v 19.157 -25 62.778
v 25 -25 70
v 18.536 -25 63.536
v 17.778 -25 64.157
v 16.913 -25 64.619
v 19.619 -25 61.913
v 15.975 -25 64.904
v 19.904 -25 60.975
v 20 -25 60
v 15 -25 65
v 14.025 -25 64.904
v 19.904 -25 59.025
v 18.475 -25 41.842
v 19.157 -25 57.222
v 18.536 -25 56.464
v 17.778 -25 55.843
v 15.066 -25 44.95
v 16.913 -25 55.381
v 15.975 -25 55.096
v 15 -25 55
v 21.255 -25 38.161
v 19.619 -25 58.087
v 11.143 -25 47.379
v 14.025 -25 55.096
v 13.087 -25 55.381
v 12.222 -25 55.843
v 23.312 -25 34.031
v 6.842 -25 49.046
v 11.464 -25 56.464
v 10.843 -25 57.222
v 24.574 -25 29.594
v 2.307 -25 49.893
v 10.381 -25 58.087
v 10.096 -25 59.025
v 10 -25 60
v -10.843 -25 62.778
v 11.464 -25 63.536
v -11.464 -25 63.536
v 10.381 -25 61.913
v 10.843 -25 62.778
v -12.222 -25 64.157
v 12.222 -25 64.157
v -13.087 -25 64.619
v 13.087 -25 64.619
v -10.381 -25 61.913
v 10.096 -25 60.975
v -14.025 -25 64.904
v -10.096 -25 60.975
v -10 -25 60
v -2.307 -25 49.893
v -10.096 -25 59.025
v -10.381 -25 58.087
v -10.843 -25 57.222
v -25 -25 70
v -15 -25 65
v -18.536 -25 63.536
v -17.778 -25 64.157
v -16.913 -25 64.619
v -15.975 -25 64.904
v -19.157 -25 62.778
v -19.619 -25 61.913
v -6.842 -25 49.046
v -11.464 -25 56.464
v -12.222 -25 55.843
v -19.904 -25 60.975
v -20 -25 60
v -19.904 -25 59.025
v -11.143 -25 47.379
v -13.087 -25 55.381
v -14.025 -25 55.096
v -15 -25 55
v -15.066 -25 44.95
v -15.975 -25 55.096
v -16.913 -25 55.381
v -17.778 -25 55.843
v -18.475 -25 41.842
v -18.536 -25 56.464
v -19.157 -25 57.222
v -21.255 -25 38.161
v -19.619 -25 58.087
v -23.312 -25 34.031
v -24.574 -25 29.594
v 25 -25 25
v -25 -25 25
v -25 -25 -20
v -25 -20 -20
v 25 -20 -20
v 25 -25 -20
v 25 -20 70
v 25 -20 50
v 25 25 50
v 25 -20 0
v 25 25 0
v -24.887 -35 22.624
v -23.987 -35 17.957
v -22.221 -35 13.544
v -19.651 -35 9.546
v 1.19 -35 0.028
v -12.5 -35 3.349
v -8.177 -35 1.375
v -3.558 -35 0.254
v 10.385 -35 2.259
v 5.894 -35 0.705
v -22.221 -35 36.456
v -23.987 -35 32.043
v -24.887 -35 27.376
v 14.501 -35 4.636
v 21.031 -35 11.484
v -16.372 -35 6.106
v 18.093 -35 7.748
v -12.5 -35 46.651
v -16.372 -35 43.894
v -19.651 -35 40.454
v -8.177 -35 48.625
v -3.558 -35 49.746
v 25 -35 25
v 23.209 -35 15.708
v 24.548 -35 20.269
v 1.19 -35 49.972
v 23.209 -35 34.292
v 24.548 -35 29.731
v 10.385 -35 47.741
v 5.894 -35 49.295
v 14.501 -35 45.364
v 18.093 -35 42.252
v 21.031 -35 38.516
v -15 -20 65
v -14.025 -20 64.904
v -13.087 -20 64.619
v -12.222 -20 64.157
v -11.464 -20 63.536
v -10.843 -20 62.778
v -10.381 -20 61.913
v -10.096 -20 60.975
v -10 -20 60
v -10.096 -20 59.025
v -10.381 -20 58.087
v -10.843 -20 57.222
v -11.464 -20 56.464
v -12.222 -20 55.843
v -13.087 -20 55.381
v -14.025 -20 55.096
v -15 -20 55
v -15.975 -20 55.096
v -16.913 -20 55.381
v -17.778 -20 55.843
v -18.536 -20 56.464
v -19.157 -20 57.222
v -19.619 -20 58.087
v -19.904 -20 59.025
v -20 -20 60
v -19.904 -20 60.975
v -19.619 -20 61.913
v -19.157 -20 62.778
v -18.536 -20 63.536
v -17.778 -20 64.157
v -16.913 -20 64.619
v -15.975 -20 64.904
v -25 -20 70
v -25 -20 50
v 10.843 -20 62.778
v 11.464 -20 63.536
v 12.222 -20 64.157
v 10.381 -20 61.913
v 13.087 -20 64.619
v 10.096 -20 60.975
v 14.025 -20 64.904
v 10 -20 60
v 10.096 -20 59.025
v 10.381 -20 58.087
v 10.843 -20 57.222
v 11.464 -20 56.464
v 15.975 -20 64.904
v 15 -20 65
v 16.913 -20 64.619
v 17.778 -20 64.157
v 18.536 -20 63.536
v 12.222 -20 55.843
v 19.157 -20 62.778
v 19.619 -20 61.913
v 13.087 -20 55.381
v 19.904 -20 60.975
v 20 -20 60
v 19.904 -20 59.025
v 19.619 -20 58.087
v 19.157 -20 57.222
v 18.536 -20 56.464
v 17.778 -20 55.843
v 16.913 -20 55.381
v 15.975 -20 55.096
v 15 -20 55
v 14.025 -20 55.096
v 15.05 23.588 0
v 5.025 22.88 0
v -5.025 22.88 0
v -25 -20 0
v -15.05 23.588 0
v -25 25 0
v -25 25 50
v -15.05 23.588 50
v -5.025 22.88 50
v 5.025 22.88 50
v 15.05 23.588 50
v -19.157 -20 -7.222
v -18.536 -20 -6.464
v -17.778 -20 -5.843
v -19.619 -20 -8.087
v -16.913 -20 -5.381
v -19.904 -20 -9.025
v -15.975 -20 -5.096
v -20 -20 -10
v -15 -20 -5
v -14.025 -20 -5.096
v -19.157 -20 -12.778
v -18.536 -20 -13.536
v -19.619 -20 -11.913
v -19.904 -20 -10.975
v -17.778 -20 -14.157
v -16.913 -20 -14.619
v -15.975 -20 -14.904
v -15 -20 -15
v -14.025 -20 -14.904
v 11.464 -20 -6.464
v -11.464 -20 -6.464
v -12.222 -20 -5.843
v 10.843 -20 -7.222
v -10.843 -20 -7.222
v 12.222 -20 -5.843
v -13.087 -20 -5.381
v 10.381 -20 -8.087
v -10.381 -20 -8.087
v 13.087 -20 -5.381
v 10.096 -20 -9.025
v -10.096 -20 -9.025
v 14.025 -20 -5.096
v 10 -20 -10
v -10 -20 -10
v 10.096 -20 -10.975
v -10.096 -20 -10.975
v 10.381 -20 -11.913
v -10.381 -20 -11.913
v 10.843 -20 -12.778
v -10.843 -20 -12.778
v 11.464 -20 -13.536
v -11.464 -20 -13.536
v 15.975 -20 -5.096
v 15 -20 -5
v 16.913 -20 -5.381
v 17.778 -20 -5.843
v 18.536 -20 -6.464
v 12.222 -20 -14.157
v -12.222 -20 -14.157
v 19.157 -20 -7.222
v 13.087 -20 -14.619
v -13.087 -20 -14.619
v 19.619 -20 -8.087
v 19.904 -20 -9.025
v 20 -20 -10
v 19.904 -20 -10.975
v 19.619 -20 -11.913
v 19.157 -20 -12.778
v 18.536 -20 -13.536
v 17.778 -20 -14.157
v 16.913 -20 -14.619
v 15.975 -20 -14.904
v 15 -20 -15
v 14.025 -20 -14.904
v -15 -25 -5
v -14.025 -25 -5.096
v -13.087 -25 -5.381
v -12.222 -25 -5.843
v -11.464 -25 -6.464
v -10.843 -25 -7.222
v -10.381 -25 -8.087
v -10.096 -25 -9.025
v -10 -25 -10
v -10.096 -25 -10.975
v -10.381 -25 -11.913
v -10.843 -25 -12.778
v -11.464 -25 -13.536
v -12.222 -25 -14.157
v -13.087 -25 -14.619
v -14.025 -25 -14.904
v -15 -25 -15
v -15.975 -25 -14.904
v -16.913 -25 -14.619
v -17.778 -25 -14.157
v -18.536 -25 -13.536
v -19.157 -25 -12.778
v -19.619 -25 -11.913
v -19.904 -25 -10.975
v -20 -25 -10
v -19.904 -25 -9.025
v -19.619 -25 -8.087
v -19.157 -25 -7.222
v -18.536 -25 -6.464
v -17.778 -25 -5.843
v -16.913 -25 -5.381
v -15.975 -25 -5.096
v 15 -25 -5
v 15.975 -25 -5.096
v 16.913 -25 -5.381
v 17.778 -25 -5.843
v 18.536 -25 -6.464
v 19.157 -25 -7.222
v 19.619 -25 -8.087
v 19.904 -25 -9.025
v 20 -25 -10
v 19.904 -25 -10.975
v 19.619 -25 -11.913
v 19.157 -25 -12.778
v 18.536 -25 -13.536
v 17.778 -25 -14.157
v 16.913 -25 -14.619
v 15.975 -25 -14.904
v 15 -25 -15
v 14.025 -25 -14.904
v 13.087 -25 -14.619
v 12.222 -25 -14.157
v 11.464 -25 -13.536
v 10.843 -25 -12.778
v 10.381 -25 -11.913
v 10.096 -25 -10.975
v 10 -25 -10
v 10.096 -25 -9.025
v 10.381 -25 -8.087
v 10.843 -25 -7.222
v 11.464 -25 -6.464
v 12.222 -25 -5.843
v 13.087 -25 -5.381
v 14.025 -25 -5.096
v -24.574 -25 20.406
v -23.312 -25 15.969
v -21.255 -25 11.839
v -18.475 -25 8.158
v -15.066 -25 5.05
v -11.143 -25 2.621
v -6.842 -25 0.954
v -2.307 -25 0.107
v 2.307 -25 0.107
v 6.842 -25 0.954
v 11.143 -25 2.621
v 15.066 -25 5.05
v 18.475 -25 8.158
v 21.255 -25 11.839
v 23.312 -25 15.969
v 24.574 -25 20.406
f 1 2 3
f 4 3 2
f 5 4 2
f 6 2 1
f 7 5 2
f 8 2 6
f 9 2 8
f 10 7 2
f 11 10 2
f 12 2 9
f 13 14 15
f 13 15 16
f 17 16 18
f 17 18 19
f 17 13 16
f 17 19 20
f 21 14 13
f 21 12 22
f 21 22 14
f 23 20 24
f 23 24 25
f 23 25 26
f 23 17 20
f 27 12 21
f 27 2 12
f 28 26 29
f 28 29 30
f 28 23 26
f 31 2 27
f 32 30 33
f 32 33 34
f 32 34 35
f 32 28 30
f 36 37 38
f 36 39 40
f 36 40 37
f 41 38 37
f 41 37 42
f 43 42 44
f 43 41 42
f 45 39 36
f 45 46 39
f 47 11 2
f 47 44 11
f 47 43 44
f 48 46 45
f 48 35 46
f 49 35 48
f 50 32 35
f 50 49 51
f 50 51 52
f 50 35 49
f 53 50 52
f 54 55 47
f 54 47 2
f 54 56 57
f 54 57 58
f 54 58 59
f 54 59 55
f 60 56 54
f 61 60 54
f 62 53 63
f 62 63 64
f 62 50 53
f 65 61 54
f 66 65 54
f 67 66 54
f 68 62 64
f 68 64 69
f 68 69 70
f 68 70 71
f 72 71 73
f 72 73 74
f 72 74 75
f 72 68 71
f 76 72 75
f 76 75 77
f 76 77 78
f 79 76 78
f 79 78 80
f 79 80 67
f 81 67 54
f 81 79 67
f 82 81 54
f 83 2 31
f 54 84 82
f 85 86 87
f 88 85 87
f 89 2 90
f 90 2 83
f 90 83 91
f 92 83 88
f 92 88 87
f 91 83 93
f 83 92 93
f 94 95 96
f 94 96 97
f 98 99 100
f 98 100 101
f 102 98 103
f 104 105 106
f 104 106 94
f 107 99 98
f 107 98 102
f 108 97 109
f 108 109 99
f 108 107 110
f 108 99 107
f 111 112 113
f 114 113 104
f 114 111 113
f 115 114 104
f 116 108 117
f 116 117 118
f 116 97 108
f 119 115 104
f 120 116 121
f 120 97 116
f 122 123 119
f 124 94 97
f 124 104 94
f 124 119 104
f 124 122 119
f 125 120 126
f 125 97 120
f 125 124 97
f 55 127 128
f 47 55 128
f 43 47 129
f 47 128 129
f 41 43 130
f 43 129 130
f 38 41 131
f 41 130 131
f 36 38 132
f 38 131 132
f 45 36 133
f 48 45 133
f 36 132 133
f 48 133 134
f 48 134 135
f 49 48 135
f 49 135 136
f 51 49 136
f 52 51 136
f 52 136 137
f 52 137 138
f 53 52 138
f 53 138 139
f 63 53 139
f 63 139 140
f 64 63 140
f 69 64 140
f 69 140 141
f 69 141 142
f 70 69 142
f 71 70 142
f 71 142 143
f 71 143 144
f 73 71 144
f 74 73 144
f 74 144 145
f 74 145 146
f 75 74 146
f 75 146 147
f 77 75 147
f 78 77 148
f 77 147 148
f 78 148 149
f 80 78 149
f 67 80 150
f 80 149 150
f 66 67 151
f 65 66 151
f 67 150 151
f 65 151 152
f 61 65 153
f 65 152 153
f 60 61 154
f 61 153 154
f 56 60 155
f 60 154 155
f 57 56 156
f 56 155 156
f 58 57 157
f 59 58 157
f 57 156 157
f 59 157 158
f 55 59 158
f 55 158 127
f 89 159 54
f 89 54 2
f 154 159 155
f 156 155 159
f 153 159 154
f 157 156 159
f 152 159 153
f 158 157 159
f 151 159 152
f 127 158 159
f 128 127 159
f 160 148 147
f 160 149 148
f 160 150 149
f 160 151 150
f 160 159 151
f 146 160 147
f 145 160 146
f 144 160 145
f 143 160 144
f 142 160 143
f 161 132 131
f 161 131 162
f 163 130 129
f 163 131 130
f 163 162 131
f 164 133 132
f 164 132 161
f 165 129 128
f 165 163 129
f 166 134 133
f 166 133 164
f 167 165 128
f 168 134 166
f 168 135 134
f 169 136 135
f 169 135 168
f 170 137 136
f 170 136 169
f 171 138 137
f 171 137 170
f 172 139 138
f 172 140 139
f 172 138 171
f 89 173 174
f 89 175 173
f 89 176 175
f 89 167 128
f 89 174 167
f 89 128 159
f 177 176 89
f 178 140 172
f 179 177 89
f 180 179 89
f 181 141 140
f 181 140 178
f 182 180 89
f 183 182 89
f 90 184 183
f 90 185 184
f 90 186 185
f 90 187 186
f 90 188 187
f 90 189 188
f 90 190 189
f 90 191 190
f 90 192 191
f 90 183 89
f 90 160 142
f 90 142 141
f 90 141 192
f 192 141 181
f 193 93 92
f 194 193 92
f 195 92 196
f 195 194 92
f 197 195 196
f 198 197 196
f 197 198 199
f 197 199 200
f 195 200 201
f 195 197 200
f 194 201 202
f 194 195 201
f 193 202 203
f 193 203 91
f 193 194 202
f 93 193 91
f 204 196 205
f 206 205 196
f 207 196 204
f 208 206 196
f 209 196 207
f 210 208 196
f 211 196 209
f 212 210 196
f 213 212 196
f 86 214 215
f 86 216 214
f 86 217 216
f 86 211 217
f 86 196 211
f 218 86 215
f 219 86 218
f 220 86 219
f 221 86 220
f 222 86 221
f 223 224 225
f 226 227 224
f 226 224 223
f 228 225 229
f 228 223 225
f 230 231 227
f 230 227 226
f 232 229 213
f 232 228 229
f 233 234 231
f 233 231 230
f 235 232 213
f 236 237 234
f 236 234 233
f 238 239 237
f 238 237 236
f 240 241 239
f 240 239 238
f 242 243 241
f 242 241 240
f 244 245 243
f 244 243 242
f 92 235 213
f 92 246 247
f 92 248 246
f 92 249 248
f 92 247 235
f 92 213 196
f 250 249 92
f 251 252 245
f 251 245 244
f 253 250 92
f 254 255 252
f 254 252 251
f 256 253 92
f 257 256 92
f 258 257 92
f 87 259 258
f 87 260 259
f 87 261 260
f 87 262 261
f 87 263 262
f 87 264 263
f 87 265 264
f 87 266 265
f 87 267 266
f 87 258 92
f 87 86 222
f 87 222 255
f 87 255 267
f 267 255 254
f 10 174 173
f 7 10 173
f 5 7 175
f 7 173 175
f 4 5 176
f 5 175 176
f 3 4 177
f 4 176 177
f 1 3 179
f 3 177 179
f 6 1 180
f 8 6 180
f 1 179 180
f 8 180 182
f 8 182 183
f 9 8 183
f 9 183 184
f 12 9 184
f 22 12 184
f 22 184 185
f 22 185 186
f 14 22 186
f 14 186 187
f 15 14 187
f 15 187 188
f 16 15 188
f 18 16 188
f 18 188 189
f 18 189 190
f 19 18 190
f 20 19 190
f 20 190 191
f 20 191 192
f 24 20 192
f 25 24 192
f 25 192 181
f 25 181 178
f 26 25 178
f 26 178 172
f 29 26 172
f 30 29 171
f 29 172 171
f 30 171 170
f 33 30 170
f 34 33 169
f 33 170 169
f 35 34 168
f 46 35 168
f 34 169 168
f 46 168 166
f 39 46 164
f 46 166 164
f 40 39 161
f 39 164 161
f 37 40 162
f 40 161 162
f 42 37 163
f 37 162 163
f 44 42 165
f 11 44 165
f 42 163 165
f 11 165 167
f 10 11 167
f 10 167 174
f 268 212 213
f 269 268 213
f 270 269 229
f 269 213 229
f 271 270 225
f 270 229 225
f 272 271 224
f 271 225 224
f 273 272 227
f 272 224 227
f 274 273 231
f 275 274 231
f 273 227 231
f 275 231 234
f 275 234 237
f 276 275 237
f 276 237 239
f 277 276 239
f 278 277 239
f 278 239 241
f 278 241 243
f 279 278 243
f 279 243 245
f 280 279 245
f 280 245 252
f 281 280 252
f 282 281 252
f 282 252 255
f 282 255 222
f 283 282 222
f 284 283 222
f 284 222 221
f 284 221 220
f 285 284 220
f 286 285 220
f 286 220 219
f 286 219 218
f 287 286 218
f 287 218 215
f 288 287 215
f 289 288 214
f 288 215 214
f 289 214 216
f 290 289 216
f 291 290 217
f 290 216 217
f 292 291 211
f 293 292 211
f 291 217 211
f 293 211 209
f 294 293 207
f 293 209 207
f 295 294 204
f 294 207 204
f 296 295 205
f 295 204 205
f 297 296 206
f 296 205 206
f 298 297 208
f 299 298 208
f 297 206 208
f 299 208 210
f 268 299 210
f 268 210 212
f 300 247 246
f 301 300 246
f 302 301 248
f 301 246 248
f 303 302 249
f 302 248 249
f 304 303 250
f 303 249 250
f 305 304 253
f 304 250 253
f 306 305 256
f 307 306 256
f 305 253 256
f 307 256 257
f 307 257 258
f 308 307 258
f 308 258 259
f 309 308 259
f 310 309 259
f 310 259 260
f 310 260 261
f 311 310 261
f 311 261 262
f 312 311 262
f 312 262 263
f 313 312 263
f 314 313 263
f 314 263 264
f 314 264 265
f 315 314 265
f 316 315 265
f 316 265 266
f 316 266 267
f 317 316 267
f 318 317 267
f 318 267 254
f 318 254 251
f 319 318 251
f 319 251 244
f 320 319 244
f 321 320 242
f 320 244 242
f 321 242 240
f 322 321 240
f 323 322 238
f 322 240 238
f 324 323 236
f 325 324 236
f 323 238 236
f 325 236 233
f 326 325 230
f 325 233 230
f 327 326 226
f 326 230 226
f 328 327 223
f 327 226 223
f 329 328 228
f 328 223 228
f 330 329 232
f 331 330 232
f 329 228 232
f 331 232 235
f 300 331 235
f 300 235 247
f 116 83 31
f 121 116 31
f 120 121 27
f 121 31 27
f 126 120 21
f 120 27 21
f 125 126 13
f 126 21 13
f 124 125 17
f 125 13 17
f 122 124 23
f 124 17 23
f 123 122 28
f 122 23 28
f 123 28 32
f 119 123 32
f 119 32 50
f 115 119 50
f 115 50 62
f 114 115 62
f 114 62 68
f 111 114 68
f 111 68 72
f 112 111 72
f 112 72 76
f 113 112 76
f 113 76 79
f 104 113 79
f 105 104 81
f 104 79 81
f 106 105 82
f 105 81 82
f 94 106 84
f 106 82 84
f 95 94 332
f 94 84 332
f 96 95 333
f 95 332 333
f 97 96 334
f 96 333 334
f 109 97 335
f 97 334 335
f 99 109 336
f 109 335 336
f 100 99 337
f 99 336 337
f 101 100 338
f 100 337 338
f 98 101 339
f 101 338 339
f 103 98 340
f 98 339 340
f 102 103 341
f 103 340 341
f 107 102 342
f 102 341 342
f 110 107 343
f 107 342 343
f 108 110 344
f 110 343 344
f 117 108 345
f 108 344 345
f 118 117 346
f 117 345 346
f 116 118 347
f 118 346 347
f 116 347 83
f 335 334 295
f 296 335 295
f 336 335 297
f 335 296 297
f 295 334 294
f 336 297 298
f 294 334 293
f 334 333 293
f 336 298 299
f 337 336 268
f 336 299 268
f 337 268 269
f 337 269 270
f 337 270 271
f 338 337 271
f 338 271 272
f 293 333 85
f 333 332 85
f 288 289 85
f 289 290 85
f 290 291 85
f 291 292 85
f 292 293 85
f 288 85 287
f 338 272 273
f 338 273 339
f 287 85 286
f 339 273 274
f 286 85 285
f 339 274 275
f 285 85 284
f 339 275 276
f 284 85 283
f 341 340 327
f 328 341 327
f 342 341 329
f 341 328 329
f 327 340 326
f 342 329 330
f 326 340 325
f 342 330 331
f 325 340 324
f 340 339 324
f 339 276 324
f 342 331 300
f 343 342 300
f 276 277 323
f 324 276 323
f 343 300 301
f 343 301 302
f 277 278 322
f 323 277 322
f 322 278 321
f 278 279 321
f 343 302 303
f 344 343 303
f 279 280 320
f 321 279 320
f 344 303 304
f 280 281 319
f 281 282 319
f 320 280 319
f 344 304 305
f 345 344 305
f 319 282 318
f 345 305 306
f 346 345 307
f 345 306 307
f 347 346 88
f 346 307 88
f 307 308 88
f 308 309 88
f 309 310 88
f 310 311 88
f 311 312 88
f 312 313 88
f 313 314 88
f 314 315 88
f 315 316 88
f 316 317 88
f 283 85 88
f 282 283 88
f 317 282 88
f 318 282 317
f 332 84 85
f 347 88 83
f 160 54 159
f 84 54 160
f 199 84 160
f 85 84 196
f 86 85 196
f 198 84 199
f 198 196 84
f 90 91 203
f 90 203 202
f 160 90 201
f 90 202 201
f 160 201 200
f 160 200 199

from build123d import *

# Parameters (mm, degrees)
BOSS_EXTRUDE1_DEPTH      = 50
SKETCH2_R                = 25
BOSS_EXTRUDE2_DEPTH      = 10
BOSS_EXTRUDE3_DEPTH      = 20
BOSS_EXTRUDE3_DEPTH_BACK = 70
SKETCH3_W                = 50
SKETCH3_H                = 5
SKETCH4_R                = 5
CUT_EXTRUDE1_DEPTH       = 10


with BuildPart() as part:
    # Sketch1 → Boss-Extrude1 (new body)
    with BuildSketch(Plane.XY):
        with BuildLine():
            Line((25, 25), (25, -25))
            Line((25, -25), (-25, -25))
            Line((-25, -25), (-25, 25))
            ThreePointArc((-25, 25), (0, 22.791003179), (25, 25))
        make_face()
    extrude(amount=BOSS_EXTRUDE1_DEPTH)

    # Sketch2 → Boss-Extrude2 (add)
    with BuildSketch(Plane.XZ.offset(25)):
        with Locations((0, 25)):
            Circle(SKETCH2_R)
    extrude(amount=BOSS_EXTRUDE2_DEPTH)

    # Sketch3 → Boss-Extrude3 (add, two sides: drawn at the far end of the back side and taken through both)
    with BuildSketch(Plane.XY.offset(50).offset(-BOSS_EXTRUDE3_DEPTH_BACK)):
        with Locations((0, -22.5)):
            Rectangle(SKETCH3_W, SKETCH3_H)
    extrude(amount=BOSS_EXTRUDE3_DEPTH + BOSS_EXTRUDE3_DEPTH_BACK)

    # Sketch4 → Cut-Extrude1 (cut)
    with BuildSketch(Plane(origin=(0, -20, 0), x_dir=(1, 0, 0), z_dir=(0, 1, 0))):
        with Locations(Location((-15, -60, 0), (0, 0, 270))):
            Circle(SKETCH4_R)
        with Locations(Location((15, -60, 0), (0, 0, 270))):
            Circle(SKETCH4_R)
        with Locations(Location((15, 10, 0), (0, 0, 270))):
            Circle(SKETCH4_R)
        with Locations(Location((-15, 10, 0), (0, 0, 270))):
            Circle(SKETCH4_R)
    extrude(amount=-CUT_EXTRUDE1_DEPTH, mode=Mode.SUBTRACT)


solid = part.part
